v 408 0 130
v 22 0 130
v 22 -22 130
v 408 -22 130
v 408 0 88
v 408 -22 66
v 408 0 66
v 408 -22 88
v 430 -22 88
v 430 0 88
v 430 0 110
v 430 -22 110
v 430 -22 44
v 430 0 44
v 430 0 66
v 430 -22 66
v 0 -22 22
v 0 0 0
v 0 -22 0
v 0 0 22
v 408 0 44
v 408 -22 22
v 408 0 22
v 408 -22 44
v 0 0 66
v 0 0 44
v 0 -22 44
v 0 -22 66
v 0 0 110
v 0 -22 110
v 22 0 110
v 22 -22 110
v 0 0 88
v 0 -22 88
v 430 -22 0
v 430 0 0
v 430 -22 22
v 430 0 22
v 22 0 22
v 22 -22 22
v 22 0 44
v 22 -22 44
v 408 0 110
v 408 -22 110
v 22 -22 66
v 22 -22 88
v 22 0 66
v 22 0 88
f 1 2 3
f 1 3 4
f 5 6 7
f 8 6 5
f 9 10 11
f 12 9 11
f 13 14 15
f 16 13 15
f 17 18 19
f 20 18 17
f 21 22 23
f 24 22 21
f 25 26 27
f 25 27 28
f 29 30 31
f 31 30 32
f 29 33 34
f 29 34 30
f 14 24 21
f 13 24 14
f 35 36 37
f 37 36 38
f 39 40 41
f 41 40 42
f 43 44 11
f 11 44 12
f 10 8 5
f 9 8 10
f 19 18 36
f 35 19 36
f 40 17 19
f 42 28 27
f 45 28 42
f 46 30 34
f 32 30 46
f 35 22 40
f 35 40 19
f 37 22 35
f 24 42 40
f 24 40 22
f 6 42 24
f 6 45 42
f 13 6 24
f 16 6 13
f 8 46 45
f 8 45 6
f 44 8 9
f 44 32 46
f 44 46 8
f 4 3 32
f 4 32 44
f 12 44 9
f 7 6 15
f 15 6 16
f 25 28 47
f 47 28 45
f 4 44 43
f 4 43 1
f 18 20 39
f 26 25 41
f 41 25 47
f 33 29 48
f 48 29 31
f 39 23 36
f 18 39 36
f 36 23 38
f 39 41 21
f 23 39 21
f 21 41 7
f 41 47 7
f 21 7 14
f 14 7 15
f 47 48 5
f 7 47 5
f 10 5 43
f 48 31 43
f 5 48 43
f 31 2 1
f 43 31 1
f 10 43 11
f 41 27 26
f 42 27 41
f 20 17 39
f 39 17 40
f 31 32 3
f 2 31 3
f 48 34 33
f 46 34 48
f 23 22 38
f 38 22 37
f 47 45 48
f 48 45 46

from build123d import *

# Parameters (mm, degrees)
F0_W     = 430
F0_H     = 130
F1_DEPTH = 22
F2_W     = 22
F2_H     = 22
F2_H_2   = 20
F3_DEPTH = 25


with BuildPart() as f1:
    # F0 (on Front) → F1 (new body)
    with BuildSketch(Plane.XZ):
        with Locations((215, 65)):
            Rectangle(F0_W, F0_H)
    extrude(amount=F1_DEPTH)

    # F2 (on face) → F3 (cut)
    with BuildSketch(Plane.XZ.offset(22)):
        with Locations((11, 33)):
            Rectangle(F2_W, F2_H)
        with Locations((11, 77)):
            Rectangle(F2_W, F2_H)
        with Locations((419, 77)):
            Rectangle(F2_W, F2_H)
        with Locations((419, 33)):
            Rectangle(F2_W, F2_H)
        with Locations((11, 120)):
            Rectangle(F2_W, F2_H_2)
        with Locations((419, 120)):
            Rectangle(F2_W, F2_H_2)
    extrude(amount=-F3_DEPTH, mode=Mode.SUBTRACT)


solid = f1.part
